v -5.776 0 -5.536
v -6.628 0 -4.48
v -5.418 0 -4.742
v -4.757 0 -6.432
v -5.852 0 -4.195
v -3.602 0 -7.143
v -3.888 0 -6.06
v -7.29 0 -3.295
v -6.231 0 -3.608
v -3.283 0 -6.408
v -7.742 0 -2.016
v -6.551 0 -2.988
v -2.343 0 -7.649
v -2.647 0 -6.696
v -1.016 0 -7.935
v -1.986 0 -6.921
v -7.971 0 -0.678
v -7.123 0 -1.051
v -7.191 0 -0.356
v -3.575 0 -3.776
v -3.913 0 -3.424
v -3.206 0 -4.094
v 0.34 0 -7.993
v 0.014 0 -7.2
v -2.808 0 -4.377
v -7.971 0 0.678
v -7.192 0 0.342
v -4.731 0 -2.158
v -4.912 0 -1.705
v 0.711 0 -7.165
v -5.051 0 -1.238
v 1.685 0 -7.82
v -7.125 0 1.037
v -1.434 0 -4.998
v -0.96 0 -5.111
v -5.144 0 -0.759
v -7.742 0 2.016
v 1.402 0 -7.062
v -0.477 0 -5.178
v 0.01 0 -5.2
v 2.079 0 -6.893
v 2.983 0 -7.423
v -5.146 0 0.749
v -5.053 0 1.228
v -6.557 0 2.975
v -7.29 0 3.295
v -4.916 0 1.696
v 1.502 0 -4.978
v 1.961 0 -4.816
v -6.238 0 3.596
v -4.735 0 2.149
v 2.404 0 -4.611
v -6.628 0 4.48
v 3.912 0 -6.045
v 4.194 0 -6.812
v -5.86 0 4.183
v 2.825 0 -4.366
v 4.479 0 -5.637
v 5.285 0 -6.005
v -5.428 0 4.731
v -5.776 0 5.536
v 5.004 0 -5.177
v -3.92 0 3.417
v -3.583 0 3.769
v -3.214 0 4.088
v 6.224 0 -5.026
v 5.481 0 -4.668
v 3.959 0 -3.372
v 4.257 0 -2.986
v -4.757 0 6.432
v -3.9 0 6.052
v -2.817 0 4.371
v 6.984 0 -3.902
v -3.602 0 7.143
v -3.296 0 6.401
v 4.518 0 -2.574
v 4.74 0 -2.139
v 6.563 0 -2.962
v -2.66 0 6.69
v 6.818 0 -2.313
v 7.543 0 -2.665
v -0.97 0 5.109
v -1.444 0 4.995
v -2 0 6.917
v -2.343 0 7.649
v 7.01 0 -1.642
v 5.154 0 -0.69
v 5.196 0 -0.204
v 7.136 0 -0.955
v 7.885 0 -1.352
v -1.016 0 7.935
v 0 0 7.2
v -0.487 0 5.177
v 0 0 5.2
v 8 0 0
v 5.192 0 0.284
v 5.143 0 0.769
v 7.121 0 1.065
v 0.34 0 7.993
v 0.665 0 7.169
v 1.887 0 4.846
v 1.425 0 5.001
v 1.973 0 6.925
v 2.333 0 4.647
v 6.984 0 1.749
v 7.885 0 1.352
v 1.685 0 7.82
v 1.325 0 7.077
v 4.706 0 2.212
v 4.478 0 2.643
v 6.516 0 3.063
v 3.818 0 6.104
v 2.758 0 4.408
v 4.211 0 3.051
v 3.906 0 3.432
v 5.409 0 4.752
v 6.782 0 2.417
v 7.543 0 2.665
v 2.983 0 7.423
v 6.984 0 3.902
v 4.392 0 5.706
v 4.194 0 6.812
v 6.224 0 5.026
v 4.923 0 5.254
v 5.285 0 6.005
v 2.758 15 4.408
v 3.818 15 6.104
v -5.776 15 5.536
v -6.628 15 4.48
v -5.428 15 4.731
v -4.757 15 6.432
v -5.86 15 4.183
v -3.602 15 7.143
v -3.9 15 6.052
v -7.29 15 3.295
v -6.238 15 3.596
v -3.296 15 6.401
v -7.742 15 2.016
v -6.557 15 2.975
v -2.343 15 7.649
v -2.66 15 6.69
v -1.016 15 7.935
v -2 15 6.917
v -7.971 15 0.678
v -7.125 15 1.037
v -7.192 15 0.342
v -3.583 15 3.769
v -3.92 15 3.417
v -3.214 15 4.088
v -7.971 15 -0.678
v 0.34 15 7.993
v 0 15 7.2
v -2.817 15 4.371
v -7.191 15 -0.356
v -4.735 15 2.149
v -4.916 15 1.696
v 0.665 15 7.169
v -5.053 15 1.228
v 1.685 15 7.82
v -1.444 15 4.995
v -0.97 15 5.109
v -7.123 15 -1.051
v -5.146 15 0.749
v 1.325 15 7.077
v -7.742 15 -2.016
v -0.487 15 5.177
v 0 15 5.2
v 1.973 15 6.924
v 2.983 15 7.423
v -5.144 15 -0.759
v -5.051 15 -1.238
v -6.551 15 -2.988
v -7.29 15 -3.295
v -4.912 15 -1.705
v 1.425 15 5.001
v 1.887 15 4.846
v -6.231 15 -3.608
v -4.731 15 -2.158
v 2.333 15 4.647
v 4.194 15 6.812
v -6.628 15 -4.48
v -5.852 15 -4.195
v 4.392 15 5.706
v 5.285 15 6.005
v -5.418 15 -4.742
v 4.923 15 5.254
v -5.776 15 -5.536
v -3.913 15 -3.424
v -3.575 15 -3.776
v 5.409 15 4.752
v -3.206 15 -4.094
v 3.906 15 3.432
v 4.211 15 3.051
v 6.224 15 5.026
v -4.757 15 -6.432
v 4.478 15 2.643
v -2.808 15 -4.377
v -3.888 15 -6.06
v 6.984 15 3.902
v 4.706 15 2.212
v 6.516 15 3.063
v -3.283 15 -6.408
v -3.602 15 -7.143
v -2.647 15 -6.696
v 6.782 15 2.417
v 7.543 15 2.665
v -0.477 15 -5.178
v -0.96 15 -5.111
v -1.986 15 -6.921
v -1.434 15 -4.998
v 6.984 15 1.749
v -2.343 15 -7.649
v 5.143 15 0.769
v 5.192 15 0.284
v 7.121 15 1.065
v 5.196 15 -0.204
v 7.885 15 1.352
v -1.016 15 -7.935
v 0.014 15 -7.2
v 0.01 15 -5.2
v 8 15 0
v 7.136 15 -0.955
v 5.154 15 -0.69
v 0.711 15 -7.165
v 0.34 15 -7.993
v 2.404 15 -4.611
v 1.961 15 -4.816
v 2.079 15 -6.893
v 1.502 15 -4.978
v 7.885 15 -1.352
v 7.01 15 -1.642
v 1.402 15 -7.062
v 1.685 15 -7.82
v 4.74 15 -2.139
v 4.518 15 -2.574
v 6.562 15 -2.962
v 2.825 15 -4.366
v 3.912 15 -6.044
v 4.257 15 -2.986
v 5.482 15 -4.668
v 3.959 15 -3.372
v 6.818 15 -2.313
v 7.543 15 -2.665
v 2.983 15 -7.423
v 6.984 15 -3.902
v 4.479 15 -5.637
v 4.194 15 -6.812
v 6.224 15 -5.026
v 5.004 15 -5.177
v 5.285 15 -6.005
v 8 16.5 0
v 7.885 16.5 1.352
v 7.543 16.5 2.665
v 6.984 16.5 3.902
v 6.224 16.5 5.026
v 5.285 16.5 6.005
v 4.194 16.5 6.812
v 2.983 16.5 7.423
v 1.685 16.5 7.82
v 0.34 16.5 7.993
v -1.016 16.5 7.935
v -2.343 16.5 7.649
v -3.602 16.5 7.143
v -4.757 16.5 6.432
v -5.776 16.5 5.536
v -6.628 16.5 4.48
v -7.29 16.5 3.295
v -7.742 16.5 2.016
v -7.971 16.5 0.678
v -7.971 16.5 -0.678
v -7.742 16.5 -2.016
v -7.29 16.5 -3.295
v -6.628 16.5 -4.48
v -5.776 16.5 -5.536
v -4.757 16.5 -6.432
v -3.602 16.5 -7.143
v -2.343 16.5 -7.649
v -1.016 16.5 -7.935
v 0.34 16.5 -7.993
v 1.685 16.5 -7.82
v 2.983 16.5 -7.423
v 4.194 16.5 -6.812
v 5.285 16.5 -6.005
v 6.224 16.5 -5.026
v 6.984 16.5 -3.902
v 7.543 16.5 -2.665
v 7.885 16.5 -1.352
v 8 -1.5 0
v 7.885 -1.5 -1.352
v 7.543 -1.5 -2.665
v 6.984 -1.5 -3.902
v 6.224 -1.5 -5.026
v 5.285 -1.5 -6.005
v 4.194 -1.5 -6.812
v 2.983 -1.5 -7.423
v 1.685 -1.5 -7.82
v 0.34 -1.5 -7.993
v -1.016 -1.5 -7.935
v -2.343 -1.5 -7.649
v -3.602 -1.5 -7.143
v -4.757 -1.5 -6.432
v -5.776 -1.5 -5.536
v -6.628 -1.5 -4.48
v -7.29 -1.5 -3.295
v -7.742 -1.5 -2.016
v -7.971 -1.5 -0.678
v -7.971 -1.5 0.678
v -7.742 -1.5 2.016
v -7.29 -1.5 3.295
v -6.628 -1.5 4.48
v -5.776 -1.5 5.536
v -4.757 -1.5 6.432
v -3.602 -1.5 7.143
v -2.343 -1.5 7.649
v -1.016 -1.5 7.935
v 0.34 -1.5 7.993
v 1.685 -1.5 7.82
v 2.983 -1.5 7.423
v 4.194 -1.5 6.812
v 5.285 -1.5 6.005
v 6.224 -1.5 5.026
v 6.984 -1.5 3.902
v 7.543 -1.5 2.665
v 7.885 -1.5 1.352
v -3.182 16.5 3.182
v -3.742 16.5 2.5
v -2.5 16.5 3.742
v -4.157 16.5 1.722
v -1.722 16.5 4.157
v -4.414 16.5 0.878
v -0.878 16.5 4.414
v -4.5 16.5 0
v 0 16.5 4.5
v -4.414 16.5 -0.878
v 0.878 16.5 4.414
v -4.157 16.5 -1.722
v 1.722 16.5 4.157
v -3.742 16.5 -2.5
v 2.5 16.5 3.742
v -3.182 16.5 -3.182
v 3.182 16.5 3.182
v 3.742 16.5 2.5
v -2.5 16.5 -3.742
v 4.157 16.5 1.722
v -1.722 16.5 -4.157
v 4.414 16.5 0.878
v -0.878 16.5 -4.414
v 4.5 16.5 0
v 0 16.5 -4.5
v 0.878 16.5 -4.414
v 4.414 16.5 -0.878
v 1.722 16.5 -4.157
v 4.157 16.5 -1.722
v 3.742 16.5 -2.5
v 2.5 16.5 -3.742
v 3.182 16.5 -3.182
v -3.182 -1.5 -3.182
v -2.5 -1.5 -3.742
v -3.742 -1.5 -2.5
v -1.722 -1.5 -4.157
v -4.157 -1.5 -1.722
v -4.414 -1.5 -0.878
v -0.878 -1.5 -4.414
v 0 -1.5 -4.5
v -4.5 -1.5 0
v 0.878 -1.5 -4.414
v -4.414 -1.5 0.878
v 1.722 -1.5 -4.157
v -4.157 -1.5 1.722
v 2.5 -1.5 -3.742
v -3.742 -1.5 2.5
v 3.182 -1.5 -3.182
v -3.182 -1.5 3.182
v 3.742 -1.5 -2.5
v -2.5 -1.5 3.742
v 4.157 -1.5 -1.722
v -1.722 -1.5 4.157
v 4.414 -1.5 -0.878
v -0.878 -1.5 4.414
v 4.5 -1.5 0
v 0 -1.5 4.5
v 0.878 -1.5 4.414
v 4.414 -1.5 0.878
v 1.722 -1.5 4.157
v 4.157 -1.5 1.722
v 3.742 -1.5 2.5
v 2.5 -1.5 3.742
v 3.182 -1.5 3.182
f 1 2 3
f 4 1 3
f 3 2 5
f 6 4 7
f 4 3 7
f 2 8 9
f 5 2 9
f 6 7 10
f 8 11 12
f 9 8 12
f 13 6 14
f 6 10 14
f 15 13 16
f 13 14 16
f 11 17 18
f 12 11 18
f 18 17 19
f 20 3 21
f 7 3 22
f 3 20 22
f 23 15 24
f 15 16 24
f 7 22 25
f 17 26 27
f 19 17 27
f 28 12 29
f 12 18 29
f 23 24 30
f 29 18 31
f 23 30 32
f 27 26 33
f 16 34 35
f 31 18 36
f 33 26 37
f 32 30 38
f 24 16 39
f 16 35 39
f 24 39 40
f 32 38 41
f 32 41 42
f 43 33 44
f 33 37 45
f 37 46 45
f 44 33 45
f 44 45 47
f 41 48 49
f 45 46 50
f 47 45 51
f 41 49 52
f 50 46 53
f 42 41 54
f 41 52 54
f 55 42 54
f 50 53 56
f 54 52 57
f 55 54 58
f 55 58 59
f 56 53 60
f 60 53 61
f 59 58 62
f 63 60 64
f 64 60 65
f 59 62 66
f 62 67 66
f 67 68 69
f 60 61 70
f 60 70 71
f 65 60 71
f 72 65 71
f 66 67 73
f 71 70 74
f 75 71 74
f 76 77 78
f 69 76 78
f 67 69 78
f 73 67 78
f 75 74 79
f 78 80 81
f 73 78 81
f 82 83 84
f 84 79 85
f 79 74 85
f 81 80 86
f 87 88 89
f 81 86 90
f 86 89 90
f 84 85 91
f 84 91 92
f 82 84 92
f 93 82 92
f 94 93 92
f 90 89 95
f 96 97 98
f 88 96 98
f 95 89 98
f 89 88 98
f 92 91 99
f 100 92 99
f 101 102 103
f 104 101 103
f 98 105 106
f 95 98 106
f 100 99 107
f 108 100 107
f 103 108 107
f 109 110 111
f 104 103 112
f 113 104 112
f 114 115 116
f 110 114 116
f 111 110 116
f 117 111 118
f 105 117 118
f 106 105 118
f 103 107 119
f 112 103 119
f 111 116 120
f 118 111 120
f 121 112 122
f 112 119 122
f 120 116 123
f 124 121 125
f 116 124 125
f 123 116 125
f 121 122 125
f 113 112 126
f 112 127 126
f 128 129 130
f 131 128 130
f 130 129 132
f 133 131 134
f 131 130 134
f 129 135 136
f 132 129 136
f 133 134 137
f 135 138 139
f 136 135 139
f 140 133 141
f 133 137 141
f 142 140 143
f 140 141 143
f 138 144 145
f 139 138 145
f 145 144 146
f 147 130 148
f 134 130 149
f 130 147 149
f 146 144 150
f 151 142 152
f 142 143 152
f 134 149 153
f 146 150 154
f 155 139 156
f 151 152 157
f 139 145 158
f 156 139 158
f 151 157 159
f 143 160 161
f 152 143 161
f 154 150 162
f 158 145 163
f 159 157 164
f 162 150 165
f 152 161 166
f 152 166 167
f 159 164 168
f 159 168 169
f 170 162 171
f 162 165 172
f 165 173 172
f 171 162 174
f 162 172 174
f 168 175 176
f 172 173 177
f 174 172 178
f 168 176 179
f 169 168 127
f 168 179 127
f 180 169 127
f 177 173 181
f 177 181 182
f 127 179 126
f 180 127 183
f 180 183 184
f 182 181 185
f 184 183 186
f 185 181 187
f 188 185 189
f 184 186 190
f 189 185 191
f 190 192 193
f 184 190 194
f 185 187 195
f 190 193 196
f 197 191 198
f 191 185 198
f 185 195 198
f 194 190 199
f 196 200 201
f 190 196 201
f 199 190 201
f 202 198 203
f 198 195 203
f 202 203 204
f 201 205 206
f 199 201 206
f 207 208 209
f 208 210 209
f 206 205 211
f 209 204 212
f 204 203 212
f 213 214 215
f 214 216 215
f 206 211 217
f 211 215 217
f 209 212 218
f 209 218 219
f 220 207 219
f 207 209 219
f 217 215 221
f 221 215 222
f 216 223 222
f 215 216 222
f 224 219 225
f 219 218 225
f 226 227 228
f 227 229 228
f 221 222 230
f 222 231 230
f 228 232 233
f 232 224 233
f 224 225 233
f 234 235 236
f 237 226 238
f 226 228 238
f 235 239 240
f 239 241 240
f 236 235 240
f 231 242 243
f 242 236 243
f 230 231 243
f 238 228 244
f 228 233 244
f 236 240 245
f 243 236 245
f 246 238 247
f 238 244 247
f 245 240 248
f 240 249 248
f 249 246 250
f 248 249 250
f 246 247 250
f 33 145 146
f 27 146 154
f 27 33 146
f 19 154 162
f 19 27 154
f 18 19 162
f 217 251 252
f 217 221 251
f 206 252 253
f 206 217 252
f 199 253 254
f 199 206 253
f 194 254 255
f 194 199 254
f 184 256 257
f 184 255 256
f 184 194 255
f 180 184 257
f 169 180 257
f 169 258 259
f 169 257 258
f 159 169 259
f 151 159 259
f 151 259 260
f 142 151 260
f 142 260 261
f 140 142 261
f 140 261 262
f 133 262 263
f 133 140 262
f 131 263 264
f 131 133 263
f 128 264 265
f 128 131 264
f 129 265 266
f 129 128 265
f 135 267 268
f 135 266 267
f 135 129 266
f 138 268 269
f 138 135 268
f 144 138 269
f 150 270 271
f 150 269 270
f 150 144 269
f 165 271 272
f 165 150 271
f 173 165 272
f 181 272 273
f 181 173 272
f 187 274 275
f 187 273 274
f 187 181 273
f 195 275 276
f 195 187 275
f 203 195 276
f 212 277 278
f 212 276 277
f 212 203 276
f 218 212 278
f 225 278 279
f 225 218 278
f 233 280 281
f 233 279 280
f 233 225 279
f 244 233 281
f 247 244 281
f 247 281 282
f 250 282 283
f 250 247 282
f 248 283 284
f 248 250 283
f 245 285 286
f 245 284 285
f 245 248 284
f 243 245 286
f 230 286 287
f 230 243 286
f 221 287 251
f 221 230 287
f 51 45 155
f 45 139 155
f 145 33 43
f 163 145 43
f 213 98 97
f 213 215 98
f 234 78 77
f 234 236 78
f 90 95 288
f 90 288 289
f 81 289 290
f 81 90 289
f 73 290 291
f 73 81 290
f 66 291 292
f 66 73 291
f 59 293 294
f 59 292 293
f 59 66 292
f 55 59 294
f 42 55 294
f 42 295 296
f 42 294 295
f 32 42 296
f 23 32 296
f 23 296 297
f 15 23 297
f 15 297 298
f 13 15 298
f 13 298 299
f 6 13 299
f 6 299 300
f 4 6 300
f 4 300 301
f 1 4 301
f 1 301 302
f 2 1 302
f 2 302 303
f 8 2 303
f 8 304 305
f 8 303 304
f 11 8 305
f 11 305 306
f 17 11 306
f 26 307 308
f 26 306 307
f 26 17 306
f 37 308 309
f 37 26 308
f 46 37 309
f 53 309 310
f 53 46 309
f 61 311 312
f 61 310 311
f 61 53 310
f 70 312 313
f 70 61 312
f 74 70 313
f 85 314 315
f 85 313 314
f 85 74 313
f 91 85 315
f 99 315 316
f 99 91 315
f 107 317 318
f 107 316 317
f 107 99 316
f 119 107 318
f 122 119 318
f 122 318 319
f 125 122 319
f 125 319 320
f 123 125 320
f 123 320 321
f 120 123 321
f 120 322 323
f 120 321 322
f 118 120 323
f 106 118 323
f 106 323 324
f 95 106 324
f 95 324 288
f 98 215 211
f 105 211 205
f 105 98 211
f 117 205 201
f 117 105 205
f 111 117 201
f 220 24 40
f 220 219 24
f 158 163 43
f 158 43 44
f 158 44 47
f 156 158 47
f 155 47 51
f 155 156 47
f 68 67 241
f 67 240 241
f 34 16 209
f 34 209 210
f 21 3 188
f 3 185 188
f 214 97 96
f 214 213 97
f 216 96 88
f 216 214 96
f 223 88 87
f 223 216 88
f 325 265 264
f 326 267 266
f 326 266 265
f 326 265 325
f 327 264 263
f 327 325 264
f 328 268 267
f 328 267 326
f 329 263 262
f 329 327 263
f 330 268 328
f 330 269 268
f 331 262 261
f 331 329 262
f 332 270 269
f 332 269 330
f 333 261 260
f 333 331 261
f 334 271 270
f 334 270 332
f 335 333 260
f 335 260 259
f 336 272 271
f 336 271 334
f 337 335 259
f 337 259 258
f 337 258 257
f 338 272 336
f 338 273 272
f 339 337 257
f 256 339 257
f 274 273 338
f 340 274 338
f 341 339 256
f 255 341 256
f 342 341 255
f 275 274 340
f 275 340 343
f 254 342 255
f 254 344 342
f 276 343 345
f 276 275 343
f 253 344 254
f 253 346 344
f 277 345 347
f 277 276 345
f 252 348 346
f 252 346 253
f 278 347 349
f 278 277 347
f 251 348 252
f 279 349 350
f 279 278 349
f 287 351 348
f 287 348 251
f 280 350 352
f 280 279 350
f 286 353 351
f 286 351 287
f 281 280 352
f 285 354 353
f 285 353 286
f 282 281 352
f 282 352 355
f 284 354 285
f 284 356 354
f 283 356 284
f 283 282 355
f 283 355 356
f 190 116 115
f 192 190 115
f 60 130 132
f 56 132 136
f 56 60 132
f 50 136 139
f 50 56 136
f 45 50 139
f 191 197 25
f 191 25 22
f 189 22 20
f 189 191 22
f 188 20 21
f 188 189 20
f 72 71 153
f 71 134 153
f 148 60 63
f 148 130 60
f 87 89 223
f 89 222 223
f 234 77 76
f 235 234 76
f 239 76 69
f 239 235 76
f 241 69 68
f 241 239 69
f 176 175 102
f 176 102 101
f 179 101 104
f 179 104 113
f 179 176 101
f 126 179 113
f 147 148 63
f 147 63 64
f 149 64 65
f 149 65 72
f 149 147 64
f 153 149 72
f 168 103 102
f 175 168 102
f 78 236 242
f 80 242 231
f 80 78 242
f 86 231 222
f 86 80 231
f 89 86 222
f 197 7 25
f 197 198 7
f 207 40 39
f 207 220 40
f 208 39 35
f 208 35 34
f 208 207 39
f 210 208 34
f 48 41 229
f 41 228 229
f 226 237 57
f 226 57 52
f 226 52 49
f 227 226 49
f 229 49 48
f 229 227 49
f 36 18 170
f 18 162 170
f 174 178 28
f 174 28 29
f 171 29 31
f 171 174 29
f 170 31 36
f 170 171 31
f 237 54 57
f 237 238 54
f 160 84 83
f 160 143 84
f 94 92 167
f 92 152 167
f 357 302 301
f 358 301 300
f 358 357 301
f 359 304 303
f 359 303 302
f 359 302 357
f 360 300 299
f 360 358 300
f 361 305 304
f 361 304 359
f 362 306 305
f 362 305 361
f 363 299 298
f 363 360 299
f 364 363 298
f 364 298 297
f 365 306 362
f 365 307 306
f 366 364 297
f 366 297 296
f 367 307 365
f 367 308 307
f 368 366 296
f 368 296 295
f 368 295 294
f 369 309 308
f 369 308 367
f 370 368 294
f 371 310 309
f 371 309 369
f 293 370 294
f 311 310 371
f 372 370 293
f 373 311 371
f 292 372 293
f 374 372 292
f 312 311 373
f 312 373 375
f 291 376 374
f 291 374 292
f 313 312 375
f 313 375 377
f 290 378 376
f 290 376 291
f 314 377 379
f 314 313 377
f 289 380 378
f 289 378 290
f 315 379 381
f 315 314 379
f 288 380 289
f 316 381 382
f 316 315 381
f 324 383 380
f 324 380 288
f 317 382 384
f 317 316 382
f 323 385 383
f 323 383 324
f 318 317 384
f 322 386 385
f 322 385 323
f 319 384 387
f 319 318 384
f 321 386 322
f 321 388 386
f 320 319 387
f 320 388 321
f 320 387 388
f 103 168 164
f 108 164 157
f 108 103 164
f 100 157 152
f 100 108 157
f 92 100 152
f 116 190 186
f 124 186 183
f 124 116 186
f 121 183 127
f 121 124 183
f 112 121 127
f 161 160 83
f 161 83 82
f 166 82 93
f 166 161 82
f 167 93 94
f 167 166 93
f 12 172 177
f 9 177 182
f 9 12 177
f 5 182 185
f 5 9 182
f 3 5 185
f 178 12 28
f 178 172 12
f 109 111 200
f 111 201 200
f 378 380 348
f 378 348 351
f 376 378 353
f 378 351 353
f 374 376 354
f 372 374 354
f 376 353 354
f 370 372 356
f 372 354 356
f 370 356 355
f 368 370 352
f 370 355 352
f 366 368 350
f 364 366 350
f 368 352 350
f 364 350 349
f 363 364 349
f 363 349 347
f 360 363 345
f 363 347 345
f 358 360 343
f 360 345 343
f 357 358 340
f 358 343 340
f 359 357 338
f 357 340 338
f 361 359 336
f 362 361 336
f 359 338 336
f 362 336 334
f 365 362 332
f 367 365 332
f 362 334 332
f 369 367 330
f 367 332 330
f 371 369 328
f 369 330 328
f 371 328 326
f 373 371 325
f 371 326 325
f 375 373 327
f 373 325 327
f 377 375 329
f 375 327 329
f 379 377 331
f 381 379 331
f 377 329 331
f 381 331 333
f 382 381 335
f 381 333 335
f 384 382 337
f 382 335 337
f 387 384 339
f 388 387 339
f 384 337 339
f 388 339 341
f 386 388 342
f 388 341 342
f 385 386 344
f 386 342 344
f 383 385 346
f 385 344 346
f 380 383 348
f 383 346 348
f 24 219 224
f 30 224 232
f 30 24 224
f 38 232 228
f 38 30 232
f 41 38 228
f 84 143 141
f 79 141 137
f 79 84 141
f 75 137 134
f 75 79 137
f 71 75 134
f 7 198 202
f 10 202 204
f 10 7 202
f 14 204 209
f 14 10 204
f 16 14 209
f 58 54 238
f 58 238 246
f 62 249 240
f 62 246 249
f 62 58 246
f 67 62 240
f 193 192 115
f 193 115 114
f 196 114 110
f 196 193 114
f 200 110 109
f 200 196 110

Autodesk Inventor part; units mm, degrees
ref_plane "YZ Plane" through (0, 0, 0) normal (1, 0, 0) x (0, 1, 0)
ref_plane "XZ Plane" through (0, 0, 0) normal (0, 1, 0) x (-1, 0, 0)
ref_plane "XY Plane" through (0, 0, 0) normal (0, 0, 1) x (1, 0, 0)
sketch "Esquisse2" plane through (0, 0, 0) normal (0, 1, 0) x (-1, 0, 0)
  circle A0 centre (0, 0) radius 7.2
  dimension "d0" = 14.4
extrude "Extrusion1" add sketch "Esquisse2" along normal blind 15
sketch "Esquisse4" plane through (0, 15, 0) normal (0, 1, 0) x (1, 0, 0)
  circle A0 centre (0, 0) radius 7.2 projected
  circle A1 centre (0, 0) radius 7.2 projected
  arc A2 (-2, -6.9166) -> (0, -7.2) centre (0, 0) ccw
  arc A3 (-1.4444, -4.9954) -> (0, -5.2) centre (0, 0) ccw
  line L0 (-2, -6.9166) -> (-1.4444, -4.9954)
  line L1 (0, -7.2) -> (0, -5.2)
  line L2 (0, 0) -> (-4.1531, -9.129)
  arc A4 (-5.4277, -4.7308) -> (-3.9, -6.0523) centre (0, 0) ccw
  arc A5 (-3.92, -3.4167) -> (-2.8167, -4.3711) centre (0, 0) ccw
  line L3 (-3.9, -6.0523) -> (-2.8167, -4.3711)
  line L4 (-5.4277, -4.7308) -> (-3.92, -3.4167)
  line L5 (0, -6) -> (0, 5.5969) construction
  line L6 (0, 0) -> (-5.5895, -3.594)
  arc A6 (-6.5507, 2.988) -> (-7.1229, 1.0507) centre (0, 0) ccw
  arc A7 (-4.7311, 2.158) -> (-5.1443, 0.7589) centre (0, 0) ccw
  line L7 (-7.1229, 1.0507) -> (-5.1443, 0.7589)
  line L8 (-6.5507, 2.988) -> (-4.7311, 2.158)
  arc A8 (-7.125, -1.0366) -> (-6.5566, -2.975) centre (0, 0) ccw
  arc A9 (-5.1458, -0.7487) -> (-4.7353, -2.1486) centre (0, 0) ccw
  line L9 (-7.125, -1.0366) -> (-5.1458, -0.7487)
  line L10 (-6.5566, -2.975) -> (-4.7353, -2.1486)
  line L11 (-2, -6.9166) -> (-3.9, -6.0523) construction
  line L12 (-5.4277, -4.7308) -> (-6.5566, -2.975) construction
  line L13 (-2, -6.9166) -> (0, -7.2) construction
  line L14 (0, 0) -> (-5.7368, 3.7048)
  arc A10 (-3.888, 6.06) -> (-5.4183, 4.7415) centre (0, 0) ccw
  line L15 (-5.4183, 4.7415) -> (-3.9132, 3.4244)
  line L16 (-3.888, 6.06) -> (-2.808, 4.3767)
  arc A11 (-2.808, 4.3767) -> (-3.9132, 3.4244) centre (0, 0) ccw
  line L17 (-1.9863, 6.9206) -> (-1.4345, 4.9982)
  arc A12 (0.0143, 7.2) -> (-1.9863, 6.9206) centre (0, 0) ccw
  arc A13 (0.0103, 5.2) -> (-1.4345, 4.9982) centre (0, 0) ccw
  line L18 (0.0143, 7.2) -> (0.0103, 5.2)
  line L19 (-6.5507, 2.988) -> (-5.4183, 4.7415) construction
  line L20 (0, 0) -> (1.7786, 11.975)
  arc A14 (1.9726, -6.9245) -> (3.8184, -6.1041) centre (0, 0) ccw
  arc A15 (1.4246, -5.001) -> (2.7578, -4.4085) centre (0, 0) ccw
  line L21 (1.9726, -6.9245) -> (1.4246, -5.001)
  line L22 (3.8184, -6.1041) -> (2.7578, -4.4085)
  arc A16 (7.1208, -1.0648) -> (7.1364, 0.9551) centre (0, 0) ccw
  line L23 (7.1364, 0.9551) -> (5.154, 0.6898)
  line L24 (7.1208, -1.0648) -> (5.1428, -0.7691)
  arc A17 (5.1428, -0.7691) -> (5.154, 0.6898) centre (0, 0) ccw
  line L25 (6.5161, -3.0627) -> (4.7061, -2.212)
  arc A18 (5.4089, -4.7522) -> (6.5161, -3.0627) centre (0, 0) ccw
  arc A19 (3.9064, -3.4322) -> (4.7061, -2.212) centre (0, 0) ccw
  line L26 (5.4089, -4.7522) -> (3.9064, -3.4322)
  line L27 (3.8184, -6.1041) -> (5.4089, -4.7522) construction
  line L28 (2.079, 6.8933) -> (1.5015, 4.9785)
  arc A20 (2.8253, 4.3655) -> (1.5015, 4.9785) centre (0, 0) ccw
  line L29 (3.912, 6.0445) -> (2.8253, 4.3655)
  arc A21 (3.912, 6.0445) -> (2.079, 6.8933) centre (0, 0) ccw
  arc A22 (4.7396, 2.1392) -> (3.9588, 3.3716) centre (0, 0) ccw
  line L30 (5.4815, 4.6684) -> (3.9588, 3.3716)
  line L31 (6.5625, 2.962) -> (4.7396, 2.1392)
  arc A23 (6.5625, 2.962) -> (5.4815, 4.6684) centre (0, 0) ccw
  line L32 (7.1364, 0.9551) -> (6.5625, 2.962) construction
  line L33 (0.0143, 7.2) -> (2.079, 6.8933) construction
  point P0 (3.8184, -6.1041)
  point P1 (6.5161, -3.0627)
  point P2 (7.1208, -1.0648)
  point P3 (7.1364, 0.9551)
  point P4 (5.4815, 4.6684)
  point P5 (2.079, 6.8933)
  point P6 (-6.5507, 2.988)
  point P7 (-7.1229, 1.0507)
  point P8 (-6.5566, -2.975)
  point P9 (-2, -6.9166)
  point P10 (0, -7.2)
  point P11 (-5.4277, -4.7308)
  point P12 (-3.9, -6.0523)
  dimension "d13" = 2
  dimension "d14" = 2
  dimension "d16" = 1.9
extrude "Extrusion2" cut sketch "Esquisse4" against normal through all contours A0 L24 A17 L23 | L31 A22 L30 A0 | A0 L26 A19 L25 | L29 A20 L28 A0 | A0 L21 A15 L22 | A0 L0 A3 L1 | L18 A13 L17 A0 | L16 A11 L15 A0 | A0 L4 A5 L3 | L8 A7 L7 A0 | A0 L9 A9 L10
sketch "Esquisse5" plane through (0, 15, 0) normal (0, 1, 0) x (1, 0, 0)
  point P0 (0, 0)
sketch "Esquisse6" plane through (0, 15, 0) normal (0, 1, 0) x (1, 0, 0)
  circle A0 centre (0, 0) radius 8
  dimension "d19" = 16
extrude "Extrusion3" add sketch "Esquisse6" along normal blind 1.5
sketch "Esquisse7" plane through (0, 0, 0) normal (0, -1, 0) x (1, 0, 0)
  circle A0 centre (0, 0) radius 8
extrude "Extrusion4" add sketch "Esquisse7" along normal blind 1.5
sketch "Esquisse8" plane through (0, 16.5, 0) normal (0, 1, 0) x (1, 0, 0)
  circle A0 centre (0, 0) radius 4.5
  dimension "d24" = 9
extrude "Extrusion5" cut sketch "Esquisse8" against normal through all
properties part number "Pièce_moteur_courroie_test_2"
